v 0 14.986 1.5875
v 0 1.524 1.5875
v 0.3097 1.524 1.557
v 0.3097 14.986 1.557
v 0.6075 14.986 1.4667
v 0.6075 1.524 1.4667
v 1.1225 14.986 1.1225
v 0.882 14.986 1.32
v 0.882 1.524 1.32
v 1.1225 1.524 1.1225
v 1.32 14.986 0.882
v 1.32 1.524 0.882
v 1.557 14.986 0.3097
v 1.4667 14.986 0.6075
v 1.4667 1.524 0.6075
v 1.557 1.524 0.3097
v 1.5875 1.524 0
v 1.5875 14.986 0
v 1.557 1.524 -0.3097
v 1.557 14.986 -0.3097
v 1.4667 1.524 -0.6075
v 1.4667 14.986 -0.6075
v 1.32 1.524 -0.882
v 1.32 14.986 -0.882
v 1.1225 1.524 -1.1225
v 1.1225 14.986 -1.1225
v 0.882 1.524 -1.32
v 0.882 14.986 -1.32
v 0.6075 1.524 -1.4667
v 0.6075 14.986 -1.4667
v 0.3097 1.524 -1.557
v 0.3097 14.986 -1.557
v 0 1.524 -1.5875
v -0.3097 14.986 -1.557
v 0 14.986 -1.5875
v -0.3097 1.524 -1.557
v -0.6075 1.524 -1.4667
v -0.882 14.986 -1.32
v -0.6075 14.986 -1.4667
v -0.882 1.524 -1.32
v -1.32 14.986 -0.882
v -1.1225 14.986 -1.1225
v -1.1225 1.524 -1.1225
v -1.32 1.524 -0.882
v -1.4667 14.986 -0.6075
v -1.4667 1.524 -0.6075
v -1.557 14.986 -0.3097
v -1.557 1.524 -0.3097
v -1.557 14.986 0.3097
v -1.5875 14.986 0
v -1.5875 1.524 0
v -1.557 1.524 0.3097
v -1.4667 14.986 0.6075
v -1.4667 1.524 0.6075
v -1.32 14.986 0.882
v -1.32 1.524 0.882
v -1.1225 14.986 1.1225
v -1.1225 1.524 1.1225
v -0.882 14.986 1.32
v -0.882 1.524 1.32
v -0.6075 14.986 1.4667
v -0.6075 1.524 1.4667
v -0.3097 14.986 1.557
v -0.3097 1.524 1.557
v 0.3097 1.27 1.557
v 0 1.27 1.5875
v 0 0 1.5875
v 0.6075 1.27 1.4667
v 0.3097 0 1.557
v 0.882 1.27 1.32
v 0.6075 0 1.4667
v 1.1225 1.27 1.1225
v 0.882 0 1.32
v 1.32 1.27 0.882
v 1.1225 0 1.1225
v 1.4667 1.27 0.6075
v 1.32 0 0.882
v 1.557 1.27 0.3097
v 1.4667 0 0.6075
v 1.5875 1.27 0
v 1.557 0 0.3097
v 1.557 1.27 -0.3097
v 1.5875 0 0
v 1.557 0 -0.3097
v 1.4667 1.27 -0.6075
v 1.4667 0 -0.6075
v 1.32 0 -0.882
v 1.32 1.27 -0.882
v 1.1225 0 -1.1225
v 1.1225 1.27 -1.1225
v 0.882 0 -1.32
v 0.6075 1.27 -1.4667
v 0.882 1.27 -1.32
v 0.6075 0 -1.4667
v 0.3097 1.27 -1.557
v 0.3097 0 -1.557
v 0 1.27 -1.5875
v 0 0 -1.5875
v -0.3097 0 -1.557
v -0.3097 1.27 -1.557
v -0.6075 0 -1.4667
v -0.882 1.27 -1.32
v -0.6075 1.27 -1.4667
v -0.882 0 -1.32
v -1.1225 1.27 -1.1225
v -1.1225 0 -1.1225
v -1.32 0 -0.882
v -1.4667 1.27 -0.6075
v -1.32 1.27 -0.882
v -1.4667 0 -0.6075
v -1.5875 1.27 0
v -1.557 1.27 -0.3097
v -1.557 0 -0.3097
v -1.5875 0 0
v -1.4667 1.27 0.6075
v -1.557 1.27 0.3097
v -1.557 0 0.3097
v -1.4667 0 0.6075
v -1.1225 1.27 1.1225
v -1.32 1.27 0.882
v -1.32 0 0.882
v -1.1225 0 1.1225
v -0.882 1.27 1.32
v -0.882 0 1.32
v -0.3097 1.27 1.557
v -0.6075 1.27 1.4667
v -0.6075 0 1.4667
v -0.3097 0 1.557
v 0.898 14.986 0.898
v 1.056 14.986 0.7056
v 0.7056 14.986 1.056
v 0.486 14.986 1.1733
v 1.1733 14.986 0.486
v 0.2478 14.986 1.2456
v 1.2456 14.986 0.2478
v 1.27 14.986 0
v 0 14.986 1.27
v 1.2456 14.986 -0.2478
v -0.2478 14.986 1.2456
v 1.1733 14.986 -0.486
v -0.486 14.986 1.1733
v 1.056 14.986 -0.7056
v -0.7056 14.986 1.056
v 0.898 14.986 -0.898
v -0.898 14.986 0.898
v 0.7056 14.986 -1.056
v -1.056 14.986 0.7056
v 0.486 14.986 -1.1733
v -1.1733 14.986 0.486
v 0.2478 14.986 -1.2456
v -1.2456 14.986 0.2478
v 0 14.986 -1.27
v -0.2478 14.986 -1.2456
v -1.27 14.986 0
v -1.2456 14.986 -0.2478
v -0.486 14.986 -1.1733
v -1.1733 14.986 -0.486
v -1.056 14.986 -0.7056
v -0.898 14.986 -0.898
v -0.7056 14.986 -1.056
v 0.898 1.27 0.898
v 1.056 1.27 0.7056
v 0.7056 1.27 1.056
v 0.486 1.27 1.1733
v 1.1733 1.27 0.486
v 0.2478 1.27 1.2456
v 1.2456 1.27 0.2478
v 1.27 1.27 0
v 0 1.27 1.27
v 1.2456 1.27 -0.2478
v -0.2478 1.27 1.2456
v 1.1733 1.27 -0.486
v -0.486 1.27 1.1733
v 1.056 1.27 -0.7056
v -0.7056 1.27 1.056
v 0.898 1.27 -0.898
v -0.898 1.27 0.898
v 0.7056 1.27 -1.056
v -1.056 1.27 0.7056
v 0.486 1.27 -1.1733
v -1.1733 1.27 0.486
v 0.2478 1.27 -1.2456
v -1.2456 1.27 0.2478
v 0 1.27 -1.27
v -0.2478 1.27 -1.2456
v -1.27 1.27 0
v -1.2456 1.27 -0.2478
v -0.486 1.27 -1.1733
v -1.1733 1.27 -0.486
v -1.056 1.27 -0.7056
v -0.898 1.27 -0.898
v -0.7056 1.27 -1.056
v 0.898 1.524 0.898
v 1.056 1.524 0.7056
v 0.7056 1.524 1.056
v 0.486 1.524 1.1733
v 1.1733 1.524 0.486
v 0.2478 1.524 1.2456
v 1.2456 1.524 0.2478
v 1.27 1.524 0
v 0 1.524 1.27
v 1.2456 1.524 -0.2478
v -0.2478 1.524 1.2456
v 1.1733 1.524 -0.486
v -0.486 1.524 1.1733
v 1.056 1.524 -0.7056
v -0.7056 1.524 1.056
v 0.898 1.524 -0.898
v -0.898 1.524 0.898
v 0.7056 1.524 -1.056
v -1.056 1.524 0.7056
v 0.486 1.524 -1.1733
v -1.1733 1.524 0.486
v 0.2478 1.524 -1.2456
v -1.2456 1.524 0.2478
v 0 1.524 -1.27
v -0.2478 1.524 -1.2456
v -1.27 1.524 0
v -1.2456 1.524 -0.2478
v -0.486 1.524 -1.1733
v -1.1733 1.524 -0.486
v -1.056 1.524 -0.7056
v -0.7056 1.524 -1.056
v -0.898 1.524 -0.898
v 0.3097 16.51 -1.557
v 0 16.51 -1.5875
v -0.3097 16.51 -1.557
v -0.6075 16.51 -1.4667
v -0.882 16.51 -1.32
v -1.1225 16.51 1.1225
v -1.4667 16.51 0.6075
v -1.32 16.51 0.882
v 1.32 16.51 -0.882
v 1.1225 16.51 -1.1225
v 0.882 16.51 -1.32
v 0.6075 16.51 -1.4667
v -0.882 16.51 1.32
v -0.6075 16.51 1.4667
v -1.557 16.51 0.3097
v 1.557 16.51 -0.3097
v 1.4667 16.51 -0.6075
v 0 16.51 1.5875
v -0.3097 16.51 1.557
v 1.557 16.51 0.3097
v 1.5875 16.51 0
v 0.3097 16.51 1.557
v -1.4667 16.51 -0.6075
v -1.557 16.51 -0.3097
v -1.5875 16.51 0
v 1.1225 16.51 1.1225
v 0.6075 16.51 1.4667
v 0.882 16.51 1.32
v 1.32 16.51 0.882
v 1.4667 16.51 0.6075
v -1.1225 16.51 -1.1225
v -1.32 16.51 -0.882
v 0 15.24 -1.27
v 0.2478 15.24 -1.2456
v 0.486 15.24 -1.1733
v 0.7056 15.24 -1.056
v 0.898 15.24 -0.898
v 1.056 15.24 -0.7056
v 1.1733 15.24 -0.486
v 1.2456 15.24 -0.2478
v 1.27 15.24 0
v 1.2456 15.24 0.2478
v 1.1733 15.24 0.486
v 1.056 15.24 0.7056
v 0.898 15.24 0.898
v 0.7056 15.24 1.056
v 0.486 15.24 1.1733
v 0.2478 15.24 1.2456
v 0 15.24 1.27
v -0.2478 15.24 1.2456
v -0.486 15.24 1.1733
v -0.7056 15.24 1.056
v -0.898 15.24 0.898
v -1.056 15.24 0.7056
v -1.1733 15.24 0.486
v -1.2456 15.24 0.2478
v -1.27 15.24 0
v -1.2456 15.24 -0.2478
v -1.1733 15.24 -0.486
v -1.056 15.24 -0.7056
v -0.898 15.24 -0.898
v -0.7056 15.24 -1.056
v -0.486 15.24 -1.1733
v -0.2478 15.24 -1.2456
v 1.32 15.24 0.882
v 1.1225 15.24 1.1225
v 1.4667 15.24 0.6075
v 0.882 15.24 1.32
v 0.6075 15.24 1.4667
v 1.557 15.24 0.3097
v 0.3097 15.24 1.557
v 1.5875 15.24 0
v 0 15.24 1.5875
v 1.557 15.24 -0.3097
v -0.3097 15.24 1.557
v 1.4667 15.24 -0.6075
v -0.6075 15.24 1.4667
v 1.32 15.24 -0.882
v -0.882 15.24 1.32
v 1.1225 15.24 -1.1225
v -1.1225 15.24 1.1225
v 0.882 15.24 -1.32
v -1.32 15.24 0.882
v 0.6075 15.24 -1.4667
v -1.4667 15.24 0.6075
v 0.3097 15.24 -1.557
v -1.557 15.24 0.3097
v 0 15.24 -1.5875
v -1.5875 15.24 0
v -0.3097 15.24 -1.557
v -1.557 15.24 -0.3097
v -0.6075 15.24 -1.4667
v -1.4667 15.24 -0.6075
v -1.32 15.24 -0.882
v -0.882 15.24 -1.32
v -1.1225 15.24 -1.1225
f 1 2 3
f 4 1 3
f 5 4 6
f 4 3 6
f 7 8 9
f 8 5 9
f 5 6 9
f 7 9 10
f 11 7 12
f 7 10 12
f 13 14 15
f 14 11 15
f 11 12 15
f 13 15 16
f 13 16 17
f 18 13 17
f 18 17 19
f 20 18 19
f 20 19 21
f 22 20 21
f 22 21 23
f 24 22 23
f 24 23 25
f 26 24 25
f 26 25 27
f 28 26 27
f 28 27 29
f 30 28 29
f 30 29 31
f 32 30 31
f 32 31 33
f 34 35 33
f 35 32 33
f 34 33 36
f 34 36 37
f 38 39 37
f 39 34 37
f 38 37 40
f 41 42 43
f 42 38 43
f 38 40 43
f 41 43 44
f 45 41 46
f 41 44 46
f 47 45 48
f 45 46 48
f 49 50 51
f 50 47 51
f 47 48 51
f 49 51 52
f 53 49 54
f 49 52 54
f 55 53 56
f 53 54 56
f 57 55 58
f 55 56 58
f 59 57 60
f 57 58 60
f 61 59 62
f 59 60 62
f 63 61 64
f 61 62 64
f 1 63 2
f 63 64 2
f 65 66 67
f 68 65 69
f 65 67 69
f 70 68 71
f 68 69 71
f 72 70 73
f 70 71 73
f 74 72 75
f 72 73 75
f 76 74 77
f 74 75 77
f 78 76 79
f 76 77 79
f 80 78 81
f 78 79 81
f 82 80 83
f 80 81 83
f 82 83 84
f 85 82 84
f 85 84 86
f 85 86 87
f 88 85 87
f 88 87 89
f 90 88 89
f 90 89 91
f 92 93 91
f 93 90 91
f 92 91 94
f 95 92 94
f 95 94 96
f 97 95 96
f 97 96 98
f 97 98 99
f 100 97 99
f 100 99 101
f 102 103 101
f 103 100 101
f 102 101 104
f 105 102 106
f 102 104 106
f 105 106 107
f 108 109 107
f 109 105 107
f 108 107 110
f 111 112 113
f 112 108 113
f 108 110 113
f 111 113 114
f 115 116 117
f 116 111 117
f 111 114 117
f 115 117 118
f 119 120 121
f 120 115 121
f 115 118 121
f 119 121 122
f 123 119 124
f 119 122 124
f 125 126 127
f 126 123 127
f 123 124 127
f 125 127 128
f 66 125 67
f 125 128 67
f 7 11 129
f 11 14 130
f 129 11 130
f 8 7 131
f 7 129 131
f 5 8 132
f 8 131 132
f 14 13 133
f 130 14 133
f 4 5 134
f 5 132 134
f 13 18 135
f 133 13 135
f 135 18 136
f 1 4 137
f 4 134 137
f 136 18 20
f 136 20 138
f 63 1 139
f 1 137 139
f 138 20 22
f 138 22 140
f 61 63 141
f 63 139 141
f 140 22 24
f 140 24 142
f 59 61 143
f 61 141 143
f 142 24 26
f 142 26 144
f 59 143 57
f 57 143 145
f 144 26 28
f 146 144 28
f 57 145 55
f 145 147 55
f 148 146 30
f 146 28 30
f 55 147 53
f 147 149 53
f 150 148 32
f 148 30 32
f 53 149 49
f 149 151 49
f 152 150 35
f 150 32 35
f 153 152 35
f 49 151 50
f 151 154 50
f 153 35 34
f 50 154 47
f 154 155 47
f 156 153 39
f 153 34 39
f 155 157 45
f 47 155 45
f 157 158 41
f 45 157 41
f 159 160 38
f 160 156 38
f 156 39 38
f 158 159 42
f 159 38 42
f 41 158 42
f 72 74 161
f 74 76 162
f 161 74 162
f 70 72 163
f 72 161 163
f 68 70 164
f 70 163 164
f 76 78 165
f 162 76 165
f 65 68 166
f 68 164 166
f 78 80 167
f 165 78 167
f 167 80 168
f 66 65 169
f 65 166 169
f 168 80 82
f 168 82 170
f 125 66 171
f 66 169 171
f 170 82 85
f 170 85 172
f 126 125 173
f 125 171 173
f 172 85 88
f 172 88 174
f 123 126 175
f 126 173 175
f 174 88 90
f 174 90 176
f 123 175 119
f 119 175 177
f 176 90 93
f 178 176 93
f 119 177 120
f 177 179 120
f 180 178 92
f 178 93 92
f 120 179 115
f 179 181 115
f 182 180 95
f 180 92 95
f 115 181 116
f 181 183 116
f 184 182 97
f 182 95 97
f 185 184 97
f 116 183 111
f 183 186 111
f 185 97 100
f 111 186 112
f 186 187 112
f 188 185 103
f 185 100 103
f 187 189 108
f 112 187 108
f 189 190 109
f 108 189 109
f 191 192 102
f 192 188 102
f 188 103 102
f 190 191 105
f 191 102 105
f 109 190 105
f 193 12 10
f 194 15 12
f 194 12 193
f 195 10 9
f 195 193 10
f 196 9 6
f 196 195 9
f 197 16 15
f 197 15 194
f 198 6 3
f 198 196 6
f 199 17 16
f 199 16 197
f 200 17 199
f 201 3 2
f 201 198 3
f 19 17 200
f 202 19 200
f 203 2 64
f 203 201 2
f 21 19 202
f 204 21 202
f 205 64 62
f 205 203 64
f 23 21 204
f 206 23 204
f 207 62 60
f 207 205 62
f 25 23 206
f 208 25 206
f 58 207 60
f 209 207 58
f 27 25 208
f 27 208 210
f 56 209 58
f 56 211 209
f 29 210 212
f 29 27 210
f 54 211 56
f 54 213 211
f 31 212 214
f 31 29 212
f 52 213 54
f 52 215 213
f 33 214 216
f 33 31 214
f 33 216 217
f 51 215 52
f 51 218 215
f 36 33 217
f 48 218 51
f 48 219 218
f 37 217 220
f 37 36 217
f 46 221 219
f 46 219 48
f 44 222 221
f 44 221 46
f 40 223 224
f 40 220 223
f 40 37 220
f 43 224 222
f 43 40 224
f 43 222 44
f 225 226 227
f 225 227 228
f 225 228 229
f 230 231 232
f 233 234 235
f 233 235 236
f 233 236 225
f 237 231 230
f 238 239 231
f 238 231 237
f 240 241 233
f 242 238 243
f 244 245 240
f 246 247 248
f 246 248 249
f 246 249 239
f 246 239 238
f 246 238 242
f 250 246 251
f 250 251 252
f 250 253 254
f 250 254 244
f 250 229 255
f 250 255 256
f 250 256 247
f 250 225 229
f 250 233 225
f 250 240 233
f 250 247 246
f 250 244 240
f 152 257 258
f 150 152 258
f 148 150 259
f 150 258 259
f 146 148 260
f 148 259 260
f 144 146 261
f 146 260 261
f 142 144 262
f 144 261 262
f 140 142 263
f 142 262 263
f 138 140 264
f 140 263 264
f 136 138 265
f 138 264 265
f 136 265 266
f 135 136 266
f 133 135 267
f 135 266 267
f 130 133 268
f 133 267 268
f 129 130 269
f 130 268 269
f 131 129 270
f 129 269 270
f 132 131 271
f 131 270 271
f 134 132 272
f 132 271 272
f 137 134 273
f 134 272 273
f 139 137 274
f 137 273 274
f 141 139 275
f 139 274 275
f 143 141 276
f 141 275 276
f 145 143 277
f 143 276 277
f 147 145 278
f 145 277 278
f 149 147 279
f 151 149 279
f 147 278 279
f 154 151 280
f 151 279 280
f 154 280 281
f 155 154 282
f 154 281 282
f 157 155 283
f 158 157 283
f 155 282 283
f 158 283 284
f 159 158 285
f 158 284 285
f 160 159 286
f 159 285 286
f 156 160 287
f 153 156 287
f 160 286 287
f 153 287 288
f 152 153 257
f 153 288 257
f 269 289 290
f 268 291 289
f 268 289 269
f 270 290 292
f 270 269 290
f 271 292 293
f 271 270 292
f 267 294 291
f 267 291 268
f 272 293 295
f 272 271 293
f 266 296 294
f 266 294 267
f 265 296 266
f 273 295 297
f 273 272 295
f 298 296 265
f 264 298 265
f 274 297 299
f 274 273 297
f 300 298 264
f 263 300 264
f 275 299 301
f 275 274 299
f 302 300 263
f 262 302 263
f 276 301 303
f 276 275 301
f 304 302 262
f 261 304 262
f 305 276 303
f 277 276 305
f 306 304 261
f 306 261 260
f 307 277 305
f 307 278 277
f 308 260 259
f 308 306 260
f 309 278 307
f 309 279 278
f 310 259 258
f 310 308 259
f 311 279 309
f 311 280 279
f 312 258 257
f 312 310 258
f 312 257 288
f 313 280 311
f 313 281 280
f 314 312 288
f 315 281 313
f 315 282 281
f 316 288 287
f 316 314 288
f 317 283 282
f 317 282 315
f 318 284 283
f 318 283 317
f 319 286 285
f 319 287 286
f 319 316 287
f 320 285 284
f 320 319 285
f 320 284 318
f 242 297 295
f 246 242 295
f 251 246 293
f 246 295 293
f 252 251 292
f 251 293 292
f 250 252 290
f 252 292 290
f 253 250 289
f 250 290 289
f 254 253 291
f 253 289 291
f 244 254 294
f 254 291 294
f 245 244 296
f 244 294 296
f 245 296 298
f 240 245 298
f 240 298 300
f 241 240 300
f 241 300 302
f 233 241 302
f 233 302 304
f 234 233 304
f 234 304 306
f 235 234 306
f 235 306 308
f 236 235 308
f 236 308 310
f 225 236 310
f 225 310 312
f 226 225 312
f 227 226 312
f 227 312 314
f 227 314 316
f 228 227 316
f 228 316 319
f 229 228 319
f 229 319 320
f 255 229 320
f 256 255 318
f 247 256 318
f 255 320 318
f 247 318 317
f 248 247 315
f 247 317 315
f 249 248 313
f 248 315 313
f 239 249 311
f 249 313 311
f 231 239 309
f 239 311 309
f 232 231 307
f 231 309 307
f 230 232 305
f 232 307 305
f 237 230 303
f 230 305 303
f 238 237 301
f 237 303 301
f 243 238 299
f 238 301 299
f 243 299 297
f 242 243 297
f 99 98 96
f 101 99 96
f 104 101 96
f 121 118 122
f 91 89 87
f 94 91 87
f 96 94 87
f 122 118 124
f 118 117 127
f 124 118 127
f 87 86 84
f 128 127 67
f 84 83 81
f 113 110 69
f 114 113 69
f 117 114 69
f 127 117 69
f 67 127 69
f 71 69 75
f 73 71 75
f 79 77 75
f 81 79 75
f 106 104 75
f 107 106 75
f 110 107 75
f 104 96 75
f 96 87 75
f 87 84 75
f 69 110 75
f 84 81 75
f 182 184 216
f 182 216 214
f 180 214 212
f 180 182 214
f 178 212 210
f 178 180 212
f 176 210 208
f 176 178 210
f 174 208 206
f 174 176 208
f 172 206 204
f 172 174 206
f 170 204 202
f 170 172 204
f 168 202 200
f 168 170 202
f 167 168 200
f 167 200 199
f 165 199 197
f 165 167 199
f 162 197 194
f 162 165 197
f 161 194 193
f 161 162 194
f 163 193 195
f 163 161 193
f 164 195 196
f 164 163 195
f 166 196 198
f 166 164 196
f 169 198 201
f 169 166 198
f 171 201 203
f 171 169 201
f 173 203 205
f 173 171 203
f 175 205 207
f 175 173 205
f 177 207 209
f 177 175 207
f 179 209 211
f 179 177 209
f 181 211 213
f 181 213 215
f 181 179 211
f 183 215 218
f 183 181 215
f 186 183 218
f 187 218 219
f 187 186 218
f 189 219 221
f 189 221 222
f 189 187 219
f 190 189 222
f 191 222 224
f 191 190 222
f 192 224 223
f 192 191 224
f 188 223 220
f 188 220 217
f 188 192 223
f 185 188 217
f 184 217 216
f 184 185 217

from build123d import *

# Parameters (mm, degrees)
SKETCH1_R           = 1.5875
BOSS_EXTRUDE1_DEPTH = 16.51
SKETCH3_R           = 1.903344521
SKETCH3_R_2         = 1.27
CUT_EXTRUDE2_DEPTH  = 0.254


with BuildPart() as part:
    # Sketch1 → Boss-Extrude1 (new body)
    with BuildSketch(Plane(origin=(0, 0, 0), x_dir=(1, 0, 0), z_dir=(0, 1, 0))):
        Circle(SKETCH1_R)
    extrude(amount=BOSS_EXTRUDE1_DEPTH)

    # Sketch3 → Cut-Extrude2 (cut)
    with BuildSketch(Plane(origin=(0, 1.27, 0), x_dir=(-1, 0, 0), z_dir=(0, -1, 0))):
        Circle(SKETCH3_R)
        Circle(SKETCH3_R_2, mode=Mode.SUBTRACT)
    cut_extrude2 = extrude(amount=-CUT_EXTRUDE2_DEPTH, mode=Mode.SUBTRACT)

    # Mirror2: Cut-Extrude2 across plane
    add(cut_extrude2.mirror(Plane(origin=(0, 8.255, 0), x_dir=(0, 0, 1), z_dir=(0, -1, 0))), mode=Mode.SUBTRACT)


solid = part.part
